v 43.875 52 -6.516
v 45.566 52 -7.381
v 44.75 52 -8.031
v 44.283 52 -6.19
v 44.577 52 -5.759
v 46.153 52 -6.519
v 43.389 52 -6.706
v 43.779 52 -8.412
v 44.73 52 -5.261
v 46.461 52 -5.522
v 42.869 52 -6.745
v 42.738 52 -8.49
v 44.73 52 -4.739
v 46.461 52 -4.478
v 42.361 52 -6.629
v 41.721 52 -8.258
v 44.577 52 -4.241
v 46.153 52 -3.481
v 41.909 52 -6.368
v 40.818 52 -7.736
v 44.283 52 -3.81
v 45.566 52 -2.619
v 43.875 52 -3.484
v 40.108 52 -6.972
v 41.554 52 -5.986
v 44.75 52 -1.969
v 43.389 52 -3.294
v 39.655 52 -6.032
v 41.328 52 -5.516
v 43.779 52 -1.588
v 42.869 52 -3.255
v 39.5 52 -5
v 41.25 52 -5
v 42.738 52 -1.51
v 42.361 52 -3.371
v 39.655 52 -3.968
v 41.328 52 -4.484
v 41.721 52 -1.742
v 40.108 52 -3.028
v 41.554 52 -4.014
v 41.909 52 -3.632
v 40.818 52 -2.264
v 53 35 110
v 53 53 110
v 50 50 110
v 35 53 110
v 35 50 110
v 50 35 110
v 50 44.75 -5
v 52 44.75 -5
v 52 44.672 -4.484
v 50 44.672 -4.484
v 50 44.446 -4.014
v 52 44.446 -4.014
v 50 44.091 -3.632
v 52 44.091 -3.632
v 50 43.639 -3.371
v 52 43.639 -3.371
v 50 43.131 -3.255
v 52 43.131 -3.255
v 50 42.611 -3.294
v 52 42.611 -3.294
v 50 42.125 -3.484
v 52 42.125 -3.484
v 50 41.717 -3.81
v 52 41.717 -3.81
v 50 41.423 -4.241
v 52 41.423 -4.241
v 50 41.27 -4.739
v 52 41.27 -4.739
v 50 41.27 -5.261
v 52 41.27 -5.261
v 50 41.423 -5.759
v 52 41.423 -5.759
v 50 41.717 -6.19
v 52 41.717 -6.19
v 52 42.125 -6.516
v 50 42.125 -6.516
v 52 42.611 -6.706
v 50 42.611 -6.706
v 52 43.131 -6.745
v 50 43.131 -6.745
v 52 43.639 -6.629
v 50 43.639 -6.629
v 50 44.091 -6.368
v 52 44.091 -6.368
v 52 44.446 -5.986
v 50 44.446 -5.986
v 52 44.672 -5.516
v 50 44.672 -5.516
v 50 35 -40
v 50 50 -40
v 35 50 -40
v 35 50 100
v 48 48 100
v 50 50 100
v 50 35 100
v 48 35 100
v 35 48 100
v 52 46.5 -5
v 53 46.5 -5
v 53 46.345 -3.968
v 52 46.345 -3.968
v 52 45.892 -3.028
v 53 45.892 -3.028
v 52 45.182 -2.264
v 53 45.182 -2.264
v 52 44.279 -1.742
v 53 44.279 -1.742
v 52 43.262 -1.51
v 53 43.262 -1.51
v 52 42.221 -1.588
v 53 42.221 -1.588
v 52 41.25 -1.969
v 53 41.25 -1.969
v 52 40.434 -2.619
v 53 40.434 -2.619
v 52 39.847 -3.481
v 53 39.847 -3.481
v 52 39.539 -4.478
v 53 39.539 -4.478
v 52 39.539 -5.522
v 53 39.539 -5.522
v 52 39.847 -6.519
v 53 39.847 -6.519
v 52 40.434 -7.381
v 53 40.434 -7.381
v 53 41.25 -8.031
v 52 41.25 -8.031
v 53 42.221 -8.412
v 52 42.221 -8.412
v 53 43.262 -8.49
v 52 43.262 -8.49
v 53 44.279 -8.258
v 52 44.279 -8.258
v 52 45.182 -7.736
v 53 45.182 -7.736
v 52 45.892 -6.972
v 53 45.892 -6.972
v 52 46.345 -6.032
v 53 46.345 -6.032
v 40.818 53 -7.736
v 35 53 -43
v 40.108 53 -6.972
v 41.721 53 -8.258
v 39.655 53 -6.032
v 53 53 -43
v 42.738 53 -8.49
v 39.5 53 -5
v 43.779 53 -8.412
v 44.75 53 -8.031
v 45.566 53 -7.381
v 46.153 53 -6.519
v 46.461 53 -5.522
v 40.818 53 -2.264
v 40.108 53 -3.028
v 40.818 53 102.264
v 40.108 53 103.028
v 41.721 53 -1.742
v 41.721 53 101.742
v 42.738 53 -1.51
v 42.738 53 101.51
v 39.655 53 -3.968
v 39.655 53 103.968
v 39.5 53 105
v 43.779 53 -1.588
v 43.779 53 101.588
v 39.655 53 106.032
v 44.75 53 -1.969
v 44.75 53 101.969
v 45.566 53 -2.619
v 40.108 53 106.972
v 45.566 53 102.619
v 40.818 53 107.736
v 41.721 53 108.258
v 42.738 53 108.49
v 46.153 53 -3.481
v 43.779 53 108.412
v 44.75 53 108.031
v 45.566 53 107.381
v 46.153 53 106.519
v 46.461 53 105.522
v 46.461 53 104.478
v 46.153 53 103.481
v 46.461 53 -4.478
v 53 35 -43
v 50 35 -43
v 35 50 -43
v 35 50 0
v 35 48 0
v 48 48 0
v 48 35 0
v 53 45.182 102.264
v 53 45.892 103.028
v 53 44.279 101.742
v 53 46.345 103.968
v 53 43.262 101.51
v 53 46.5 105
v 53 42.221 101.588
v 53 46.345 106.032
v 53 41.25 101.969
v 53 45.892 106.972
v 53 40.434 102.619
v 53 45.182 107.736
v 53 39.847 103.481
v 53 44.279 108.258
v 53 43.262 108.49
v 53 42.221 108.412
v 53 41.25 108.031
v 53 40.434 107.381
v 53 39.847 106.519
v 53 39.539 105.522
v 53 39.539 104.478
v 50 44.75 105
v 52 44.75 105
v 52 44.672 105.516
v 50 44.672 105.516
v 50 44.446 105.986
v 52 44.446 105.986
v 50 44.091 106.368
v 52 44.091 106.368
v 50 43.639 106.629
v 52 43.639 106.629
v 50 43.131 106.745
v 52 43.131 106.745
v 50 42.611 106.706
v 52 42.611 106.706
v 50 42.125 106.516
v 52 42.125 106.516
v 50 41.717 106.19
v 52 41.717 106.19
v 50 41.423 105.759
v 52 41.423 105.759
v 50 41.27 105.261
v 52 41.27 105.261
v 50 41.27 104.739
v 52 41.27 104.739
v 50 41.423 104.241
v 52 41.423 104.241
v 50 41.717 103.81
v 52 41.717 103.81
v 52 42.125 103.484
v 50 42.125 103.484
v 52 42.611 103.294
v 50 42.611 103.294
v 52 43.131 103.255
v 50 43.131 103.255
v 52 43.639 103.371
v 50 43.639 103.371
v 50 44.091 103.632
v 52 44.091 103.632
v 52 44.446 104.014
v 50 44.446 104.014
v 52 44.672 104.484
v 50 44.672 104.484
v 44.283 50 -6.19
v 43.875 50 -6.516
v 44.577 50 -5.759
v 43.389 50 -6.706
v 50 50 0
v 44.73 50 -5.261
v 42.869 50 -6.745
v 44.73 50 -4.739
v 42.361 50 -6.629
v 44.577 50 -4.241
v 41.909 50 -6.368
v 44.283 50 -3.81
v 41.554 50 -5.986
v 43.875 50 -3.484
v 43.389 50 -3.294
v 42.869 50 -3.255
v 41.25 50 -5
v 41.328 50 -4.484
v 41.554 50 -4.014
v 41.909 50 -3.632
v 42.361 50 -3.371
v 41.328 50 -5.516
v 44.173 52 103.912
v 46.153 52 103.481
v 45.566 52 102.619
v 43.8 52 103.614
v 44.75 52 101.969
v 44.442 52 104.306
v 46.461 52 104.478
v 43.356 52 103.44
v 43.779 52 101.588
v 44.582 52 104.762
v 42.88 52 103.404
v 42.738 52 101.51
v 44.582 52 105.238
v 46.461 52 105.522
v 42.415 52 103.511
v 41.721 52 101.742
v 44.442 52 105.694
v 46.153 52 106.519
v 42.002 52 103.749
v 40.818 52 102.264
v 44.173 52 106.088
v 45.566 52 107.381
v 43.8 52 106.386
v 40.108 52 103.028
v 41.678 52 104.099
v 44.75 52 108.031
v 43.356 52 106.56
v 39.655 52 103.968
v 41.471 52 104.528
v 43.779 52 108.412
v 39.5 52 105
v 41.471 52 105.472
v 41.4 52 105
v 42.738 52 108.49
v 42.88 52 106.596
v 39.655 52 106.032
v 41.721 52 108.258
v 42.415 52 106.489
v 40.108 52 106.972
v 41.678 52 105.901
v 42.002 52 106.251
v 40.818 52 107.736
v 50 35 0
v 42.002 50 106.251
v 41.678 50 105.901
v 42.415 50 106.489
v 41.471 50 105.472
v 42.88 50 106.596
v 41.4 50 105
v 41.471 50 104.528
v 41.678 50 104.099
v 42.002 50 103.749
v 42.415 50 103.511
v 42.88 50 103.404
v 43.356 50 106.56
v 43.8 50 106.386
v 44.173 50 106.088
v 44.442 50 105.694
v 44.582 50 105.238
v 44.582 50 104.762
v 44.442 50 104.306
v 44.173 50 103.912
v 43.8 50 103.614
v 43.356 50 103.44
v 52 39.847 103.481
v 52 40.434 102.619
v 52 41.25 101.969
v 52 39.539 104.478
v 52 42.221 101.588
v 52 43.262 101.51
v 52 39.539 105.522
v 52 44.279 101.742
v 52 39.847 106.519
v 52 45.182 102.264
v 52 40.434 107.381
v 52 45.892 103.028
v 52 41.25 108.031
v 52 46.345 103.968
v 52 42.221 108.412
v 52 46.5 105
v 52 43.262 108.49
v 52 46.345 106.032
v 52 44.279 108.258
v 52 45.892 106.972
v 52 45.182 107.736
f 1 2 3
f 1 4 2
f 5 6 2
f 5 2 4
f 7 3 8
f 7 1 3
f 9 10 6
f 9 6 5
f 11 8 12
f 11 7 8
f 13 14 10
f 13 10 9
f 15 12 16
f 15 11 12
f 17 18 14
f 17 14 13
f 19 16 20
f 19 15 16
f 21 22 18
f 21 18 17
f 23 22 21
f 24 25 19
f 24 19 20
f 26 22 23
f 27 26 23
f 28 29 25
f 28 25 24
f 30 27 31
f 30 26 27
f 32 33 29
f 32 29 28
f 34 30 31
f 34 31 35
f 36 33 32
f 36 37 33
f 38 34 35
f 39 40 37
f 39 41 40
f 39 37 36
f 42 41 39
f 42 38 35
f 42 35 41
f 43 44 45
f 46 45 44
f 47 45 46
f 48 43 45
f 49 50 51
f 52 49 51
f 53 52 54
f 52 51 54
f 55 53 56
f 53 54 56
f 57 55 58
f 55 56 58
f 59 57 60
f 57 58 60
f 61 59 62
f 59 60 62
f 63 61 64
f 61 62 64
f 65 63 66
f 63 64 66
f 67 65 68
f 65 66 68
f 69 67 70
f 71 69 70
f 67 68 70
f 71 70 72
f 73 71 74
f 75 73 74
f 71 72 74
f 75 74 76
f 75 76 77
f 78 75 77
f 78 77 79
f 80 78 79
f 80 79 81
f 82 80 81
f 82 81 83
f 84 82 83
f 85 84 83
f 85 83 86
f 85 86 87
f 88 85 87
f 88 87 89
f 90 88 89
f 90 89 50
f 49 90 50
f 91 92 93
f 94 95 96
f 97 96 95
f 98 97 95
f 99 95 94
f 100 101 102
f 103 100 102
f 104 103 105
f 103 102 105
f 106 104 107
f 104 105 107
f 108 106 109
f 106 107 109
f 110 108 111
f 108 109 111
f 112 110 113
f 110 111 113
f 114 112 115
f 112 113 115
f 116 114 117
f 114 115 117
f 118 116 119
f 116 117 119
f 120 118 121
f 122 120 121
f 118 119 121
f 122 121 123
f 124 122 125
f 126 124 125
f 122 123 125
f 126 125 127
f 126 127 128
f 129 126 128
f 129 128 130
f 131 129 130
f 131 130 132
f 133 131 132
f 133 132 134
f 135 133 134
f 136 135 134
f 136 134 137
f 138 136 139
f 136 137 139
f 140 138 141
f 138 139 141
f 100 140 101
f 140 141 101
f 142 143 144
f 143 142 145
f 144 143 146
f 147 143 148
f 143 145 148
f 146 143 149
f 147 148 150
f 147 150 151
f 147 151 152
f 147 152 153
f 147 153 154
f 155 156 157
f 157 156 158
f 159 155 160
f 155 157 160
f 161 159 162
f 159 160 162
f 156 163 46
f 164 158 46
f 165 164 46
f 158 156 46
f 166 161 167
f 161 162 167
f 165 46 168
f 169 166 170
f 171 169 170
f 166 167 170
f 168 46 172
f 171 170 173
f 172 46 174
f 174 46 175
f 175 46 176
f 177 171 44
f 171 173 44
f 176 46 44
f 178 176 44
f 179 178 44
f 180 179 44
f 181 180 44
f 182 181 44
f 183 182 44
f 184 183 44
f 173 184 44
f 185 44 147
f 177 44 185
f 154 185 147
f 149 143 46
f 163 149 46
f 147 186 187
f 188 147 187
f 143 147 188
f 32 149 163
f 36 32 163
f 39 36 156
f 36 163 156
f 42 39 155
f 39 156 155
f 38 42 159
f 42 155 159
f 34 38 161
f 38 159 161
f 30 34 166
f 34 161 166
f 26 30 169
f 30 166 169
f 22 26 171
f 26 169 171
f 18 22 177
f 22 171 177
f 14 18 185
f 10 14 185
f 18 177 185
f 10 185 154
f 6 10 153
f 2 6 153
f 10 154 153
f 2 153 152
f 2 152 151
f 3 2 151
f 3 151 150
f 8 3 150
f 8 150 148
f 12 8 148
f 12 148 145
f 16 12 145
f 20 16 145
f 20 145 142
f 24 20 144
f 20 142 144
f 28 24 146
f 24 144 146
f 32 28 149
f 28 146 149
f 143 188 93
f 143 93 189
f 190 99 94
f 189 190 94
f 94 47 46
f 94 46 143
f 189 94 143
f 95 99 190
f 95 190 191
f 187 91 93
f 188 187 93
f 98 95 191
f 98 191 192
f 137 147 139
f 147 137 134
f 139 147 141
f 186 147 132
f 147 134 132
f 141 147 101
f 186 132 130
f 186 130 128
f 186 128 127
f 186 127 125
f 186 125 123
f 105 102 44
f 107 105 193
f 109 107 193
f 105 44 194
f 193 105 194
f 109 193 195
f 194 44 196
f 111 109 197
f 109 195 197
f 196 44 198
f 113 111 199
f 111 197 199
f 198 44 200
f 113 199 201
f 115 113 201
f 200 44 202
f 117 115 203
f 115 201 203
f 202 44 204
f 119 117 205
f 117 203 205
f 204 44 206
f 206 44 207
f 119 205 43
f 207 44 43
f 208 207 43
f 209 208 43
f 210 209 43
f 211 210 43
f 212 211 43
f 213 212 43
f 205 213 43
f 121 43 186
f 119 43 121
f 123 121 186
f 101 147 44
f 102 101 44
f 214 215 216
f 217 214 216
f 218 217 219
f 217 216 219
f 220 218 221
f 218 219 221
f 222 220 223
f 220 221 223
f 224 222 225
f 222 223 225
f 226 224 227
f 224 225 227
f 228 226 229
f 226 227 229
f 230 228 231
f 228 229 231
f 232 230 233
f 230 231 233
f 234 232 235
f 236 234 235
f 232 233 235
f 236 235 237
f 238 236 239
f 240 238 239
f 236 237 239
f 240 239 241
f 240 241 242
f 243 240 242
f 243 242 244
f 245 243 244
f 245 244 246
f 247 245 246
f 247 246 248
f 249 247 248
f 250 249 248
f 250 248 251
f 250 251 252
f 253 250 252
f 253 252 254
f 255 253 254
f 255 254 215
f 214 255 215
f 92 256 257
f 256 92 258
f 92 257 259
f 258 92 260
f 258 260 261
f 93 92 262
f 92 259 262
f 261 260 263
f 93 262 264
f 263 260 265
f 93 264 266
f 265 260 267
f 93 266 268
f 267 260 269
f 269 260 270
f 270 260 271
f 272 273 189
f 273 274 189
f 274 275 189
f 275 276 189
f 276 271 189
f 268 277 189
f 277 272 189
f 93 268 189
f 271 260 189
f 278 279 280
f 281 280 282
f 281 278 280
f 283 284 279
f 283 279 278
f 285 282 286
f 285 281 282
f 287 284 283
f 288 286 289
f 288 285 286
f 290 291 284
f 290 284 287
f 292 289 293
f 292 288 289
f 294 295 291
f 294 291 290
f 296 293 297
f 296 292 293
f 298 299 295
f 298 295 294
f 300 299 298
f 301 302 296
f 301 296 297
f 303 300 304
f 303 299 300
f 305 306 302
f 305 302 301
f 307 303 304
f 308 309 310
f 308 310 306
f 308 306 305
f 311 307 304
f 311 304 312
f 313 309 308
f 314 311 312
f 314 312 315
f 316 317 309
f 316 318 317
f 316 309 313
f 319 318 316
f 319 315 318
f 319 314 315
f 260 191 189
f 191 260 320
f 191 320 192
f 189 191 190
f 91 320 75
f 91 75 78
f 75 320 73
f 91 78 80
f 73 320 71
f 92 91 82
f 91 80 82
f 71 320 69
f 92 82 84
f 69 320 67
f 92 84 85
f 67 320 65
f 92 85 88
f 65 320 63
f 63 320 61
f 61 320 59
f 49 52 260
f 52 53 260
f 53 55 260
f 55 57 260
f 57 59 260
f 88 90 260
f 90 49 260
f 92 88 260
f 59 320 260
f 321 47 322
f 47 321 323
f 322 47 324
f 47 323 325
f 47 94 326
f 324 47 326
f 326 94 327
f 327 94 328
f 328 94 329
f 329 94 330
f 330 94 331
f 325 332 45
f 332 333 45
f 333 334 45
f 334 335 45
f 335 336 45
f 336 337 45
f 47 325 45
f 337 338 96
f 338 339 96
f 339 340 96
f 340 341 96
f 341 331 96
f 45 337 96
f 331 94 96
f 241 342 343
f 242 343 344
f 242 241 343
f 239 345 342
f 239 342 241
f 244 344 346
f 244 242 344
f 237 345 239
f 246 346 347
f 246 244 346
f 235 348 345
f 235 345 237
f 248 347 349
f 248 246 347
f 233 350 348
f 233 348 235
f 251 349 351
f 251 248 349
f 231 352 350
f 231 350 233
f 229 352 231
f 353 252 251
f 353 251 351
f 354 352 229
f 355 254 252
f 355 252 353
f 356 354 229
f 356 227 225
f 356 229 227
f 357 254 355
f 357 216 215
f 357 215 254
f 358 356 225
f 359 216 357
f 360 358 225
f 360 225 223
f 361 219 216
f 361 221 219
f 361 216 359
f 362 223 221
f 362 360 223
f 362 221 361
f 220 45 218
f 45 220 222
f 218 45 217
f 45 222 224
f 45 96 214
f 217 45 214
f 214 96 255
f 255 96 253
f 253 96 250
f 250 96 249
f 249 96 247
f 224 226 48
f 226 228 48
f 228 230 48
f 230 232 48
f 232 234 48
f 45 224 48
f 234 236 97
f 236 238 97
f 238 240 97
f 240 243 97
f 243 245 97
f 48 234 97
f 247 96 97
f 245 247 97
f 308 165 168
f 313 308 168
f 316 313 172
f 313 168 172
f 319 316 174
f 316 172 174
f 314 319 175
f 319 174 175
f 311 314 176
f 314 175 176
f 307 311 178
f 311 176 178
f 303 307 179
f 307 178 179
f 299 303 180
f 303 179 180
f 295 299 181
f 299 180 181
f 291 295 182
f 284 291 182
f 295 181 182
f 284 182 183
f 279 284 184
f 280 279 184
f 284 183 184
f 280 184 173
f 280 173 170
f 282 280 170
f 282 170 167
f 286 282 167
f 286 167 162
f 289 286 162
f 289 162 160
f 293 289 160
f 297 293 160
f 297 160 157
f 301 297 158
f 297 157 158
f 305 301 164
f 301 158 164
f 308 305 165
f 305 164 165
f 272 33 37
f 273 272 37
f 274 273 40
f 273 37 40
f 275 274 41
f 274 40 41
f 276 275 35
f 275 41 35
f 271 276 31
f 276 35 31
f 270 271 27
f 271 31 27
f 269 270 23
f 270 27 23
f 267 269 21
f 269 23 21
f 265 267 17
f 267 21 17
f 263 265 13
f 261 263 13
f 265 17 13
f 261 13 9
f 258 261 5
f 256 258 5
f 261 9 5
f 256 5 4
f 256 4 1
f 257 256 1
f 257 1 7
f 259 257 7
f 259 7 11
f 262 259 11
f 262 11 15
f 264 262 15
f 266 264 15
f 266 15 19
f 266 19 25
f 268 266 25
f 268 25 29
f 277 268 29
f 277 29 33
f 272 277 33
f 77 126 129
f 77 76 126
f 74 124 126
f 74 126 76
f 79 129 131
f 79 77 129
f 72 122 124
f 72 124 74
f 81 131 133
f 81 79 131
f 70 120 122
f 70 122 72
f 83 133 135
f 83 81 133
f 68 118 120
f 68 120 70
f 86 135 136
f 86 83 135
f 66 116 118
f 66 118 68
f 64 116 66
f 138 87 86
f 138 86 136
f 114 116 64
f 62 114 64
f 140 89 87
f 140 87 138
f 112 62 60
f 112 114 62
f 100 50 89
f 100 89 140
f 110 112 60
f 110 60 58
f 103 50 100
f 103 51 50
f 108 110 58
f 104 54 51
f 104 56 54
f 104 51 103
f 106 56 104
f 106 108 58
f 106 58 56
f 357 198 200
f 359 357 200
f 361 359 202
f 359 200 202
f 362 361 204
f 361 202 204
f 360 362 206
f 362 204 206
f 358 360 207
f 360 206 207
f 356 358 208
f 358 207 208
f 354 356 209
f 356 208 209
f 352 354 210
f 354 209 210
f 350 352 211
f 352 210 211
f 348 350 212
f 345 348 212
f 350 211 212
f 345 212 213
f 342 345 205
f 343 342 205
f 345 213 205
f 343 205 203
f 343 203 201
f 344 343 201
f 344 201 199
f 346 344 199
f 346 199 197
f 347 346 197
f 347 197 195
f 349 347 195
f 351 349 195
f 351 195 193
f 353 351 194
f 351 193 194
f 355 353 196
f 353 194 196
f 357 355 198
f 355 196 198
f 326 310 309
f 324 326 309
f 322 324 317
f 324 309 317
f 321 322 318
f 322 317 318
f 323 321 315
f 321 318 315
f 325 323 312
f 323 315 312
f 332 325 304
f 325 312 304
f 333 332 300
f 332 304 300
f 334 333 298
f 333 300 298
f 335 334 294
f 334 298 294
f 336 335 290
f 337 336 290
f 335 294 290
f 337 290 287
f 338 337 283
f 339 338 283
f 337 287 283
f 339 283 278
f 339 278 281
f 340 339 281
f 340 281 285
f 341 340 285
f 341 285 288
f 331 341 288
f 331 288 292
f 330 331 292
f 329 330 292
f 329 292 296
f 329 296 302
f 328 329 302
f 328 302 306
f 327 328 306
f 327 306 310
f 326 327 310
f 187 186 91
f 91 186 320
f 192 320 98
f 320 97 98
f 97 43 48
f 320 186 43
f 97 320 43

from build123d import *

# Parameters (mm, degrees)
PAD016_DEPTH            = 100
PAD019_DEPTH            = 10
SKETCH047_R             = 1.6
POCKET031_DEPTH         = 5
SKETCH048_R             = 3.5
POCKET027_DEPTH         = 1
SKETCH049_R             = 1.75
POCKET028_DEPTH         = 5
SKETCH050_R             = 3.5
POCKET029_DEPTH         = 1
PAD017_DEPTH            = 40
PAD018_DEPTH            = 3
SKETCH043_R             = 1.75
POCKET030_DEPTH         = 5
SKETCH054_R             = 3.5
POCKET034_DEPTH         = 1
SKETCH052_R             = 1.75
POCKET032_DEPTH         = 5
SKETCH053_R             = 3.5
POCKET033_DEPTH         = 1
BODY006_PLACEMENT_ANGLE = 180


with BuildPart() as part:
    # Sketch044 → Pad016 (new body)
    with BuildSketch(Plane.XY):
        Polygon((-53, -35), (-53, -53), (-35, -53), (-35, -48), (-48, -48), (-48, -35), align=None)
    extrude(amount=PAD016_DEPTH)

    # Sketch046 (on Face8 of Pad016) → Pad019 (join)
    with BuildSketch(Plane.XY.offset(100)):
        Polygon((-53, -35), (-53, -53), (-35, -53), (-35, -50), (-50, -50), (-50, -35), align=None)
    extrude(amount=PAD019_DEPTH)

    # Sketch047 (on Face14 of Pad019) → Pocket031 (cut)
    with BuildSketch(Plane.XZ.offset(53)):
        with Locations((-43, 105)):
            Circle(SKETCH047_R)
    extrude(amount=-POCKET031_DEPTH, mode=Mode.SUBTRACT)

    # Sketch048 (on Face14 of Pocket031) → Pocket027 (cut)
    with BuildSketch(Plane.XZ.offset(53)):
        with Locations((-43, 105)):
            Circle(SKETCH048_R)
    extrude(amount=-POCKET027_DEPTH, mode=Mode.SUBTRACT)

    # Sketch049 (on Face9 of Pocket027) → Pocket028 (cut)
    with BuildSketch(Plane(origin=(-53, 0, 0), x_dir=(0, -1, 0), z_dir=(-1, 0, 0))):
        with Locations((43, 105)):
            Circle(SKETCH049_R)
    extrude(amount=-POCKET028_DEPTH, mode=Mode.SUBTRACT)

    # Sketch050 (on Face9 of Pocket028) → Pocket029 (cut)
    with BuildSketch(Plane(origin=(-53, 0, 0), x_dir=(0, -1, 0), z_dir=(-1, 0, 0))):
        with Locations((43, 105)):
            Circle(SKETCH050_R)
    extrude(amount=-POCKET029_DEPTH, mode=Mode.SUBTRACT)

    # Sketch045 (on Face4 of Pocket029) → Pad017 (join)
    with BuildSketch(Plane(origin=(0, 0, 0), x_dir=(1, 0, 0), z_dir=(0, 0, -1))):
        Polygon((-35, 53), (-53, 53), (-53, 35), (-50, 35), (-50, 50), (-35, 50), align=None)
    extrude(amount=PAD017_DEPTH)

    # Sketch051 (on Face15 of Pad017) → Pad018 (join)
    with BuildSketch(Plane(origin=(0, 0, -40), x_dir=(1, 0, 0), z_dir=(0, 0, -1))):
        Polygon((-35, 50), (-35, 53), (-53, 53), (-53, 35), (-50, 35), align=None)
    extrude(amount=PAD018_DEPTH)

    # Sketch043 (on Face10 of Pad018) → Pocket030 (cut)
    with BuildSketch(Plane(origin=(-53, 0, 0), x_dir=(0, -1, 0), z_dir=(-1, 0, 0))):
        with Locations((43, -5)):
            Circle(SKETCH043_R)
    extrude(amount=-POCKET030_DEPTH, mode=Mode.SUBTRACT)

    # Sketch054 (on Face10 of Pocket030) → Pocket034 (cut)
    with BuildSketch(Plane(origin=(-53, 0, 0), x_dir=(0, -1, 0), z_dir=(-1, 0, 0))):
        with Locations((43, -5)):
            Circle(SKETCH054_R)
    extrude(amount=-POCKET034_DEPTH, mode=Mode.SUBTRACT)

    # Sketch052 (on Face19 of Pocket034) → Pocket032 (cut)
    with BuildSketch(Plane.XZ.offset(53)):
        with Locations((-43, -5)):
            Circle(SKETCH052_R)
    extrude(amount=-POCKET032_DEPTH, mode=Mode.SUBTRACT)

    # Sketch053 (on Face19 of Pocket032) → Pocket033 (cut)
    with BuildSketch(Plane.XZ.offset(53)):
        with Locations((-43, -5)):
            Circle(SKETCH053_R)
    extrude(amount=-POCKET033_DEPTH, mode=Mode.SUBTRACT)


with BuildPart() as part_1:
    # Body006 placement: moved
    add(part.part.rotate(Axis((0, 0, 0), (0, 0, 1)), BODY006_PLACEMENT_ANGLE))


solid = part_1.part
